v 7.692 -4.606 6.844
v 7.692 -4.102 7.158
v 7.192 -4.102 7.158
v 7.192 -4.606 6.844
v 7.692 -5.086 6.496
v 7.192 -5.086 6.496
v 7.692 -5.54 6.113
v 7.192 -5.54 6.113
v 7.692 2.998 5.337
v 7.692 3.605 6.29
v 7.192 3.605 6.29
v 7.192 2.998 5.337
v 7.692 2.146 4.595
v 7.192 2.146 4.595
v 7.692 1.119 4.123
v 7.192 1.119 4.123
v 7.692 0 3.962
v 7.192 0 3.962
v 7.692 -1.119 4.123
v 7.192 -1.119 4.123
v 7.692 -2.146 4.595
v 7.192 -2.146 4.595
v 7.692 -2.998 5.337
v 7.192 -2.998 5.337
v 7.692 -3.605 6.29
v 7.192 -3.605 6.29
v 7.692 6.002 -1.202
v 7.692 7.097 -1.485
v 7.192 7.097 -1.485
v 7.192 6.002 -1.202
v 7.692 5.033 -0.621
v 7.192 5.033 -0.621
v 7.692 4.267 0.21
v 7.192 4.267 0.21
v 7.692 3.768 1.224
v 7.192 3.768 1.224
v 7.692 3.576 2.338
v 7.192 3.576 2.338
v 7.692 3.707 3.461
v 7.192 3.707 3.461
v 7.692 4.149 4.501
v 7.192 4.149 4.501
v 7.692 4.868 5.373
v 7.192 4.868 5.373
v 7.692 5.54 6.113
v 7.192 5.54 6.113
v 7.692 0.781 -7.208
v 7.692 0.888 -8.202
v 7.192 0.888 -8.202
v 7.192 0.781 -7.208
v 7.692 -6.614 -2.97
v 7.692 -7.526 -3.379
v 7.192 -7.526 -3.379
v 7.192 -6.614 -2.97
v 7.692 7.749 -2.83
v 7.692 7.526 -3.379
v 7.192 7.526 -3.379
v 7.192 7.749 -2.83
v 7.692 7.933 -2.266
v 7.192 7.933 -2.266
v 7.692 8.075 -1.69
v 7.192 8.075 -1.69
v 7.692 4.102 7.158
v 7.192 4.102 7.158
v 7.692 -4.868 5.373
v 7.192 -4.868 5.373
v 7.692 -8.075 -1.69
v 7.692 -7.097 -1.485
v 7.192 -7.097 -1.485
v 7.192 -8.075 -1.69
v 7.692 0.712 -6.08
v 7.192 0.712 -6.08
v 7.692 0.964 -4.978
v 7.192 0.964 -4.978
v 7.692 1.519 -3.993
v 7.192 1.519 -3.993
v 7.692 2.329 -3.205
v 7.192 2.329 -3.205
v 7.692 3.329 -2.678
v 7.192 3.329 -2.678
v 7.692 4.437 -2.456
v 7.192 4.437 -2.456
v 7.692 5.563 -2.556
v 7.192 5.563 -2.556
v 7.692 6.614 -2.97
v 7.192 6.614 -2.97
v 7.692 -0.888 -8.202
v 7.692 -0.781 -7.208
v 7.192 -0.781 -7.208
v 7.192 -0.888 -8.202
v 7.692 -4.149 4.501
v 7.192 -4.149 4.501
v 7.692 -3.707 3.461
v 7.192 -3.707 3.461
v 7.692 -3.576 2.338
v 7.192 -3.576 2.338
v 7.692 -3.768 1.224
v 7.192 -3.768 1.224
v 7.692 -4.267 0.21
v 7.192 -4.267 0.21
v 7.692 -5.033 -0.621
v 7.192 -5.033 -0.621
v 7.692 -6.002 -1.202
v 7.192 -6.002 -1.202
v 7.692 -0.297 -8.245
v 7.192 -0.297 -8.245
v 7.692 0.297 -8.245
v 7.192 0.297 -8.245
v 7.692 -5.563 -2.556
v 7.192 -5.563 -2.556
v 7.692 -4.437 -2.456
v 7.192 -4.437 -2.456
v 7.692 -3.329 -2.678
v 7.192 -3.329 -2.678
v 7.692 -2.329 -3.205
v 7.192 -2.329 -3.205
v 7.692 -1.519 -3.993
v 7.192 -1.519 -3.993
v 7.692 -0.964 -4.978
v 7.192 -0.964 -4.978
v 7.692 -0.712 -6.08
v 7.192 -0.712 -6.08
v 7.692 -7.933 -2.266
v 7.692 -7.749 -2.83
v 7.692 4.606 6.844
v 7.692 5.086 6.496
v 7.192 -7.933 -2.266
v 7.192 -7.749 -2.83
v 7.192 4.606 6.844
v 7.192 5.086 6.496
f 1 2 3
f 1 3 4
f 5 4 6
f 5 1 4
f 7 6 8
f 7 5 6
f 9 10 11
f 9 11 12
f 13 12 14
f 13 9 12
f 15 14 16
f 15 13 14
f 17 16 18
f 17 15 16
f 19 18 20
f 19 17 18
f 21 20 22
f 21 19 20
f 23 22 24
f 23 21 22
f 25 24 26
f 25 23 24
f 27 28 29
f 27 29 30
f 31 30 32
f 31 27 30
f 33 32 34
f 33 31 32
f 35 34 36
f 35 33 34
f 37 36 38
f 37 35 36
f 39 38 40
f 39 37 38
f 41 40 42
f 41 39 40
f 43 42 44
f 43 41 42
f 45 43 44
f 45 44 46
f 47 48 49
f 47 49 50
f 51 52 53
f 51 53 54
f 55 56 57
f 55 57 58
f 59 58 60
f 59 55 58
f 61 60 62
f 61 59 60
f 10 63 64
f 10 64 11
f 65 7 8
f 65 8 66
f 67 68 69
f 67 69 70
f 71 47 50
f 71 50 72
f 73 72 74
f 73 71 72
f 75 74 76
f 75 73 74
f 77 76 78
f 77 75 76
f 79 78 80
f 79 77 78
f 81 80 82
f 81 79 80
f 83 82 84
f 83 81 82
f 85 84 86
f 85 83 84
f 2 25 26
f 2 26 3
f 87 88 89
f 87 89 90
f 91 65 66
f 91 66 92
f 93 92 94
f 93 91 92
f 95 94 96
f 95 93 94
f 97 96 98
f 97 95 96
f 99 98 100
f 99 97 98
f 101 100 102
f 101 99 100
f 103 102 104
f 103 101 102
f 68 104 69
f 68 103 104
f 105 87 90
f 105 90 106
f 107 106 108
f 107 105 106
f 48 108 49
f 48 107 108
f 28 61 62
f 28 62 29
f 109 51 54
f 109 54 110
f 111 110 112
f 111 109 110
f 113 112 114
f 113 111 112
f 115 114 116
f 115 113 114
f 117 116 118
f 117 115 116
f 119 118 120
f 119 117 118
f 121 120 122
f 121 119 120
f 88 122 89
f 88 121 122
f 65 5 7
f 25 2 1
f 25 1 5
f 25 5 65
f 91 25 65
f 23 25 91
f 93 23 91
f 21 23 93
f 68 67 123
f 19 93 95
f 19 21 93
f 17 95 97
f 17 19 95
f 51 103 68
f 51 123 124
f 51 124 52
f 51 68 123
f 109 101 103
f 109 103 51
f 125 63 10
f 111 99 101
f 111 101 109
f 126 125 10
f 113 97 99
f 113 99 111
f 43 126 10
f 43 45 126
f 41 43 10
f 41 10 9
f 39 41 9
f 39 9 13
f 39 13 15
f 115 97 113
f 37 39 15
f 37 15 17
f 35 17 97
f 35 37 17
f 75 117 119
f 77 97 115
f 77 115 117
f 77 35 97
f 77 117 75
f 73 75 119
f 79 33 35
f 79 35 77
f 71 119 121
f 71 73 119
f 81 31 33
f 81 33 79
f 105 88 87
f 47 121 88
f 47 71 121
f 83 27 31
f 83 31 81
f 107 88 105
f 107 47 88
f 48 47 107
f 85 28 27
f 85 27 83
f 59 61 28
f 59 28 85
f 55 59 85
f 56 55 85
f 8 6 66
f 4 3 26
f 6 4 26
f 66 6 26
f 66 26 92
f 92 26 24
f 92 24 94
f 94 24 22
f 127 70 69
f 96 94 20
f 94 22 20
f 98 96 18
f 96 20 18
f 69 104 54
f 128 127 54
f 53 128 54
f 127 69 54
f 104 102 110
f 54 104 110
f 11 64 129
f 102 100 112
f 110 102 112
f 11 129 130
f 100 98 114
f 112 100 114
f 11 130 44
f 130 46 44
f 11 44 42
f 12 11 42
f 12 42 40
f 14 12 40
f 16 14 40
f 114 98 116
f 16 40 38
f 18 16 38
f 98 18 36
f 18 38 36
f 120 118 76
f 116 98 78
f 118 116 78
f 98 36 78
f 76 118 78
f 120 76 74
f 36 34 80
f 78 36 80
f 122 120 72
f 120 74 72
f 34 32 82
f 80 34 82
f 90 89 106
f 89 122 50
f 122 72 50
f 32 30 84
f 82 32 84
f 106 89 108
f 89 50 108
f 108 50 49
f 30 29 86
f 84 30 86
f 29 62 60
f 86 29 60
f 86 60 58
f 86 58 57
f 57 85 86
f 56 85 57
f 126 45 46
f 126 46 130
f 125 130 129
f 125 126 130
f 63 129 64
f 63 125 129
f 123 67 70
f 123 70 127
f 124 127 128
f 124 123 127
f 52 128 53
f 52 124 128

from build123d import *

# Parameters (mm, degrees)
ESTRUSIONE_ESTRUSIONE1_DEPTH = 0.5


with BuildPart() as part:
    # Schizzo1 → Estrusione-Estrusione1 (new body)
    with BuildSketch(Plane(origin=(7.692307692, 0, 0), x_dir=(0, 0, -1), z_dir=(1, 0, 0))):
        with BuildLine():
            Line((-6.113475279, -5.539667861), (-5.372640914, -4.868367801))
            ThreePointArc((-5.372640914, -4.868367801), (-1.224247655, -3.767846854), (1.485003008, -7.096551381))
            Line((1.485003008, -7.096551381), (1.689770324, -8.075096052))
            ThreePointArc((1.689770324, -8.075096052), (2.549390204, -7.846216259), (3.379369462, -7.526112014))
            Line((3.379369462, -7.526112014), (2.969855574, -6.614093536))
            ThreePointArc((2.969855574, -6.614093536), (3.205121972, -2.32865742), (7.2081126, -0.780633191))
            Line((7.2081126, -0.780633191), (8.202040467, -0.888274834))
            ThreePointArc((8.202040467, -0.888274834), (8.25, 0), (8.202040467, 0.888274834))
            Line((8.202040467, 0.888274834), (7.2081126, 0.780633191))
            ThreePointArc((7.2081126, 0.780633191), (3.205121972, 2.32865742), (2.969855574, 6.614093536))
            Line((2.969855574, 6.614093536), (3.379369462, 7.526112014))
            ThreePointArc((3.379369462, 7.526112014), (2.549390204, 7.846216259), (1.689770324, 8.075096052))
            Line((1.689770324, 8.075096052), (1.485003008, 7.096551381))
            ThreePointArc((1.485003008, 7.096551381), (-1.224247655, 3.767846854), (-5.372640914, 4.868367801))
            Line((-5.372640914, 4.868367801), (-6.113475279, 5.539667861))
            ThreePointArc((-6.113475279, 5.539667861), (-6.674390204, 4.849228331), (-7.157704974, 4.102408989))
            Line((-7.157704974, 4.102408989), (-6.290330268, 3.605276765))
            ThreePointArc((-6.290330268, 3.605276765), (-3.961748634, 0), (-6.290330268, -3.605276765))
            Line((-6.290330268, -3.605276765), (-7.157704974, -4.102408989))
            ThreePointArc((-7.157704974, -4.102408989), (-6.674390204, -4.849228331), (-6.113475279, -5.539667861))
        make_face()
    extrude(amount=-ESTRUSIONE_ESTRUSIONE1_DEPTH)


solid = part.part
